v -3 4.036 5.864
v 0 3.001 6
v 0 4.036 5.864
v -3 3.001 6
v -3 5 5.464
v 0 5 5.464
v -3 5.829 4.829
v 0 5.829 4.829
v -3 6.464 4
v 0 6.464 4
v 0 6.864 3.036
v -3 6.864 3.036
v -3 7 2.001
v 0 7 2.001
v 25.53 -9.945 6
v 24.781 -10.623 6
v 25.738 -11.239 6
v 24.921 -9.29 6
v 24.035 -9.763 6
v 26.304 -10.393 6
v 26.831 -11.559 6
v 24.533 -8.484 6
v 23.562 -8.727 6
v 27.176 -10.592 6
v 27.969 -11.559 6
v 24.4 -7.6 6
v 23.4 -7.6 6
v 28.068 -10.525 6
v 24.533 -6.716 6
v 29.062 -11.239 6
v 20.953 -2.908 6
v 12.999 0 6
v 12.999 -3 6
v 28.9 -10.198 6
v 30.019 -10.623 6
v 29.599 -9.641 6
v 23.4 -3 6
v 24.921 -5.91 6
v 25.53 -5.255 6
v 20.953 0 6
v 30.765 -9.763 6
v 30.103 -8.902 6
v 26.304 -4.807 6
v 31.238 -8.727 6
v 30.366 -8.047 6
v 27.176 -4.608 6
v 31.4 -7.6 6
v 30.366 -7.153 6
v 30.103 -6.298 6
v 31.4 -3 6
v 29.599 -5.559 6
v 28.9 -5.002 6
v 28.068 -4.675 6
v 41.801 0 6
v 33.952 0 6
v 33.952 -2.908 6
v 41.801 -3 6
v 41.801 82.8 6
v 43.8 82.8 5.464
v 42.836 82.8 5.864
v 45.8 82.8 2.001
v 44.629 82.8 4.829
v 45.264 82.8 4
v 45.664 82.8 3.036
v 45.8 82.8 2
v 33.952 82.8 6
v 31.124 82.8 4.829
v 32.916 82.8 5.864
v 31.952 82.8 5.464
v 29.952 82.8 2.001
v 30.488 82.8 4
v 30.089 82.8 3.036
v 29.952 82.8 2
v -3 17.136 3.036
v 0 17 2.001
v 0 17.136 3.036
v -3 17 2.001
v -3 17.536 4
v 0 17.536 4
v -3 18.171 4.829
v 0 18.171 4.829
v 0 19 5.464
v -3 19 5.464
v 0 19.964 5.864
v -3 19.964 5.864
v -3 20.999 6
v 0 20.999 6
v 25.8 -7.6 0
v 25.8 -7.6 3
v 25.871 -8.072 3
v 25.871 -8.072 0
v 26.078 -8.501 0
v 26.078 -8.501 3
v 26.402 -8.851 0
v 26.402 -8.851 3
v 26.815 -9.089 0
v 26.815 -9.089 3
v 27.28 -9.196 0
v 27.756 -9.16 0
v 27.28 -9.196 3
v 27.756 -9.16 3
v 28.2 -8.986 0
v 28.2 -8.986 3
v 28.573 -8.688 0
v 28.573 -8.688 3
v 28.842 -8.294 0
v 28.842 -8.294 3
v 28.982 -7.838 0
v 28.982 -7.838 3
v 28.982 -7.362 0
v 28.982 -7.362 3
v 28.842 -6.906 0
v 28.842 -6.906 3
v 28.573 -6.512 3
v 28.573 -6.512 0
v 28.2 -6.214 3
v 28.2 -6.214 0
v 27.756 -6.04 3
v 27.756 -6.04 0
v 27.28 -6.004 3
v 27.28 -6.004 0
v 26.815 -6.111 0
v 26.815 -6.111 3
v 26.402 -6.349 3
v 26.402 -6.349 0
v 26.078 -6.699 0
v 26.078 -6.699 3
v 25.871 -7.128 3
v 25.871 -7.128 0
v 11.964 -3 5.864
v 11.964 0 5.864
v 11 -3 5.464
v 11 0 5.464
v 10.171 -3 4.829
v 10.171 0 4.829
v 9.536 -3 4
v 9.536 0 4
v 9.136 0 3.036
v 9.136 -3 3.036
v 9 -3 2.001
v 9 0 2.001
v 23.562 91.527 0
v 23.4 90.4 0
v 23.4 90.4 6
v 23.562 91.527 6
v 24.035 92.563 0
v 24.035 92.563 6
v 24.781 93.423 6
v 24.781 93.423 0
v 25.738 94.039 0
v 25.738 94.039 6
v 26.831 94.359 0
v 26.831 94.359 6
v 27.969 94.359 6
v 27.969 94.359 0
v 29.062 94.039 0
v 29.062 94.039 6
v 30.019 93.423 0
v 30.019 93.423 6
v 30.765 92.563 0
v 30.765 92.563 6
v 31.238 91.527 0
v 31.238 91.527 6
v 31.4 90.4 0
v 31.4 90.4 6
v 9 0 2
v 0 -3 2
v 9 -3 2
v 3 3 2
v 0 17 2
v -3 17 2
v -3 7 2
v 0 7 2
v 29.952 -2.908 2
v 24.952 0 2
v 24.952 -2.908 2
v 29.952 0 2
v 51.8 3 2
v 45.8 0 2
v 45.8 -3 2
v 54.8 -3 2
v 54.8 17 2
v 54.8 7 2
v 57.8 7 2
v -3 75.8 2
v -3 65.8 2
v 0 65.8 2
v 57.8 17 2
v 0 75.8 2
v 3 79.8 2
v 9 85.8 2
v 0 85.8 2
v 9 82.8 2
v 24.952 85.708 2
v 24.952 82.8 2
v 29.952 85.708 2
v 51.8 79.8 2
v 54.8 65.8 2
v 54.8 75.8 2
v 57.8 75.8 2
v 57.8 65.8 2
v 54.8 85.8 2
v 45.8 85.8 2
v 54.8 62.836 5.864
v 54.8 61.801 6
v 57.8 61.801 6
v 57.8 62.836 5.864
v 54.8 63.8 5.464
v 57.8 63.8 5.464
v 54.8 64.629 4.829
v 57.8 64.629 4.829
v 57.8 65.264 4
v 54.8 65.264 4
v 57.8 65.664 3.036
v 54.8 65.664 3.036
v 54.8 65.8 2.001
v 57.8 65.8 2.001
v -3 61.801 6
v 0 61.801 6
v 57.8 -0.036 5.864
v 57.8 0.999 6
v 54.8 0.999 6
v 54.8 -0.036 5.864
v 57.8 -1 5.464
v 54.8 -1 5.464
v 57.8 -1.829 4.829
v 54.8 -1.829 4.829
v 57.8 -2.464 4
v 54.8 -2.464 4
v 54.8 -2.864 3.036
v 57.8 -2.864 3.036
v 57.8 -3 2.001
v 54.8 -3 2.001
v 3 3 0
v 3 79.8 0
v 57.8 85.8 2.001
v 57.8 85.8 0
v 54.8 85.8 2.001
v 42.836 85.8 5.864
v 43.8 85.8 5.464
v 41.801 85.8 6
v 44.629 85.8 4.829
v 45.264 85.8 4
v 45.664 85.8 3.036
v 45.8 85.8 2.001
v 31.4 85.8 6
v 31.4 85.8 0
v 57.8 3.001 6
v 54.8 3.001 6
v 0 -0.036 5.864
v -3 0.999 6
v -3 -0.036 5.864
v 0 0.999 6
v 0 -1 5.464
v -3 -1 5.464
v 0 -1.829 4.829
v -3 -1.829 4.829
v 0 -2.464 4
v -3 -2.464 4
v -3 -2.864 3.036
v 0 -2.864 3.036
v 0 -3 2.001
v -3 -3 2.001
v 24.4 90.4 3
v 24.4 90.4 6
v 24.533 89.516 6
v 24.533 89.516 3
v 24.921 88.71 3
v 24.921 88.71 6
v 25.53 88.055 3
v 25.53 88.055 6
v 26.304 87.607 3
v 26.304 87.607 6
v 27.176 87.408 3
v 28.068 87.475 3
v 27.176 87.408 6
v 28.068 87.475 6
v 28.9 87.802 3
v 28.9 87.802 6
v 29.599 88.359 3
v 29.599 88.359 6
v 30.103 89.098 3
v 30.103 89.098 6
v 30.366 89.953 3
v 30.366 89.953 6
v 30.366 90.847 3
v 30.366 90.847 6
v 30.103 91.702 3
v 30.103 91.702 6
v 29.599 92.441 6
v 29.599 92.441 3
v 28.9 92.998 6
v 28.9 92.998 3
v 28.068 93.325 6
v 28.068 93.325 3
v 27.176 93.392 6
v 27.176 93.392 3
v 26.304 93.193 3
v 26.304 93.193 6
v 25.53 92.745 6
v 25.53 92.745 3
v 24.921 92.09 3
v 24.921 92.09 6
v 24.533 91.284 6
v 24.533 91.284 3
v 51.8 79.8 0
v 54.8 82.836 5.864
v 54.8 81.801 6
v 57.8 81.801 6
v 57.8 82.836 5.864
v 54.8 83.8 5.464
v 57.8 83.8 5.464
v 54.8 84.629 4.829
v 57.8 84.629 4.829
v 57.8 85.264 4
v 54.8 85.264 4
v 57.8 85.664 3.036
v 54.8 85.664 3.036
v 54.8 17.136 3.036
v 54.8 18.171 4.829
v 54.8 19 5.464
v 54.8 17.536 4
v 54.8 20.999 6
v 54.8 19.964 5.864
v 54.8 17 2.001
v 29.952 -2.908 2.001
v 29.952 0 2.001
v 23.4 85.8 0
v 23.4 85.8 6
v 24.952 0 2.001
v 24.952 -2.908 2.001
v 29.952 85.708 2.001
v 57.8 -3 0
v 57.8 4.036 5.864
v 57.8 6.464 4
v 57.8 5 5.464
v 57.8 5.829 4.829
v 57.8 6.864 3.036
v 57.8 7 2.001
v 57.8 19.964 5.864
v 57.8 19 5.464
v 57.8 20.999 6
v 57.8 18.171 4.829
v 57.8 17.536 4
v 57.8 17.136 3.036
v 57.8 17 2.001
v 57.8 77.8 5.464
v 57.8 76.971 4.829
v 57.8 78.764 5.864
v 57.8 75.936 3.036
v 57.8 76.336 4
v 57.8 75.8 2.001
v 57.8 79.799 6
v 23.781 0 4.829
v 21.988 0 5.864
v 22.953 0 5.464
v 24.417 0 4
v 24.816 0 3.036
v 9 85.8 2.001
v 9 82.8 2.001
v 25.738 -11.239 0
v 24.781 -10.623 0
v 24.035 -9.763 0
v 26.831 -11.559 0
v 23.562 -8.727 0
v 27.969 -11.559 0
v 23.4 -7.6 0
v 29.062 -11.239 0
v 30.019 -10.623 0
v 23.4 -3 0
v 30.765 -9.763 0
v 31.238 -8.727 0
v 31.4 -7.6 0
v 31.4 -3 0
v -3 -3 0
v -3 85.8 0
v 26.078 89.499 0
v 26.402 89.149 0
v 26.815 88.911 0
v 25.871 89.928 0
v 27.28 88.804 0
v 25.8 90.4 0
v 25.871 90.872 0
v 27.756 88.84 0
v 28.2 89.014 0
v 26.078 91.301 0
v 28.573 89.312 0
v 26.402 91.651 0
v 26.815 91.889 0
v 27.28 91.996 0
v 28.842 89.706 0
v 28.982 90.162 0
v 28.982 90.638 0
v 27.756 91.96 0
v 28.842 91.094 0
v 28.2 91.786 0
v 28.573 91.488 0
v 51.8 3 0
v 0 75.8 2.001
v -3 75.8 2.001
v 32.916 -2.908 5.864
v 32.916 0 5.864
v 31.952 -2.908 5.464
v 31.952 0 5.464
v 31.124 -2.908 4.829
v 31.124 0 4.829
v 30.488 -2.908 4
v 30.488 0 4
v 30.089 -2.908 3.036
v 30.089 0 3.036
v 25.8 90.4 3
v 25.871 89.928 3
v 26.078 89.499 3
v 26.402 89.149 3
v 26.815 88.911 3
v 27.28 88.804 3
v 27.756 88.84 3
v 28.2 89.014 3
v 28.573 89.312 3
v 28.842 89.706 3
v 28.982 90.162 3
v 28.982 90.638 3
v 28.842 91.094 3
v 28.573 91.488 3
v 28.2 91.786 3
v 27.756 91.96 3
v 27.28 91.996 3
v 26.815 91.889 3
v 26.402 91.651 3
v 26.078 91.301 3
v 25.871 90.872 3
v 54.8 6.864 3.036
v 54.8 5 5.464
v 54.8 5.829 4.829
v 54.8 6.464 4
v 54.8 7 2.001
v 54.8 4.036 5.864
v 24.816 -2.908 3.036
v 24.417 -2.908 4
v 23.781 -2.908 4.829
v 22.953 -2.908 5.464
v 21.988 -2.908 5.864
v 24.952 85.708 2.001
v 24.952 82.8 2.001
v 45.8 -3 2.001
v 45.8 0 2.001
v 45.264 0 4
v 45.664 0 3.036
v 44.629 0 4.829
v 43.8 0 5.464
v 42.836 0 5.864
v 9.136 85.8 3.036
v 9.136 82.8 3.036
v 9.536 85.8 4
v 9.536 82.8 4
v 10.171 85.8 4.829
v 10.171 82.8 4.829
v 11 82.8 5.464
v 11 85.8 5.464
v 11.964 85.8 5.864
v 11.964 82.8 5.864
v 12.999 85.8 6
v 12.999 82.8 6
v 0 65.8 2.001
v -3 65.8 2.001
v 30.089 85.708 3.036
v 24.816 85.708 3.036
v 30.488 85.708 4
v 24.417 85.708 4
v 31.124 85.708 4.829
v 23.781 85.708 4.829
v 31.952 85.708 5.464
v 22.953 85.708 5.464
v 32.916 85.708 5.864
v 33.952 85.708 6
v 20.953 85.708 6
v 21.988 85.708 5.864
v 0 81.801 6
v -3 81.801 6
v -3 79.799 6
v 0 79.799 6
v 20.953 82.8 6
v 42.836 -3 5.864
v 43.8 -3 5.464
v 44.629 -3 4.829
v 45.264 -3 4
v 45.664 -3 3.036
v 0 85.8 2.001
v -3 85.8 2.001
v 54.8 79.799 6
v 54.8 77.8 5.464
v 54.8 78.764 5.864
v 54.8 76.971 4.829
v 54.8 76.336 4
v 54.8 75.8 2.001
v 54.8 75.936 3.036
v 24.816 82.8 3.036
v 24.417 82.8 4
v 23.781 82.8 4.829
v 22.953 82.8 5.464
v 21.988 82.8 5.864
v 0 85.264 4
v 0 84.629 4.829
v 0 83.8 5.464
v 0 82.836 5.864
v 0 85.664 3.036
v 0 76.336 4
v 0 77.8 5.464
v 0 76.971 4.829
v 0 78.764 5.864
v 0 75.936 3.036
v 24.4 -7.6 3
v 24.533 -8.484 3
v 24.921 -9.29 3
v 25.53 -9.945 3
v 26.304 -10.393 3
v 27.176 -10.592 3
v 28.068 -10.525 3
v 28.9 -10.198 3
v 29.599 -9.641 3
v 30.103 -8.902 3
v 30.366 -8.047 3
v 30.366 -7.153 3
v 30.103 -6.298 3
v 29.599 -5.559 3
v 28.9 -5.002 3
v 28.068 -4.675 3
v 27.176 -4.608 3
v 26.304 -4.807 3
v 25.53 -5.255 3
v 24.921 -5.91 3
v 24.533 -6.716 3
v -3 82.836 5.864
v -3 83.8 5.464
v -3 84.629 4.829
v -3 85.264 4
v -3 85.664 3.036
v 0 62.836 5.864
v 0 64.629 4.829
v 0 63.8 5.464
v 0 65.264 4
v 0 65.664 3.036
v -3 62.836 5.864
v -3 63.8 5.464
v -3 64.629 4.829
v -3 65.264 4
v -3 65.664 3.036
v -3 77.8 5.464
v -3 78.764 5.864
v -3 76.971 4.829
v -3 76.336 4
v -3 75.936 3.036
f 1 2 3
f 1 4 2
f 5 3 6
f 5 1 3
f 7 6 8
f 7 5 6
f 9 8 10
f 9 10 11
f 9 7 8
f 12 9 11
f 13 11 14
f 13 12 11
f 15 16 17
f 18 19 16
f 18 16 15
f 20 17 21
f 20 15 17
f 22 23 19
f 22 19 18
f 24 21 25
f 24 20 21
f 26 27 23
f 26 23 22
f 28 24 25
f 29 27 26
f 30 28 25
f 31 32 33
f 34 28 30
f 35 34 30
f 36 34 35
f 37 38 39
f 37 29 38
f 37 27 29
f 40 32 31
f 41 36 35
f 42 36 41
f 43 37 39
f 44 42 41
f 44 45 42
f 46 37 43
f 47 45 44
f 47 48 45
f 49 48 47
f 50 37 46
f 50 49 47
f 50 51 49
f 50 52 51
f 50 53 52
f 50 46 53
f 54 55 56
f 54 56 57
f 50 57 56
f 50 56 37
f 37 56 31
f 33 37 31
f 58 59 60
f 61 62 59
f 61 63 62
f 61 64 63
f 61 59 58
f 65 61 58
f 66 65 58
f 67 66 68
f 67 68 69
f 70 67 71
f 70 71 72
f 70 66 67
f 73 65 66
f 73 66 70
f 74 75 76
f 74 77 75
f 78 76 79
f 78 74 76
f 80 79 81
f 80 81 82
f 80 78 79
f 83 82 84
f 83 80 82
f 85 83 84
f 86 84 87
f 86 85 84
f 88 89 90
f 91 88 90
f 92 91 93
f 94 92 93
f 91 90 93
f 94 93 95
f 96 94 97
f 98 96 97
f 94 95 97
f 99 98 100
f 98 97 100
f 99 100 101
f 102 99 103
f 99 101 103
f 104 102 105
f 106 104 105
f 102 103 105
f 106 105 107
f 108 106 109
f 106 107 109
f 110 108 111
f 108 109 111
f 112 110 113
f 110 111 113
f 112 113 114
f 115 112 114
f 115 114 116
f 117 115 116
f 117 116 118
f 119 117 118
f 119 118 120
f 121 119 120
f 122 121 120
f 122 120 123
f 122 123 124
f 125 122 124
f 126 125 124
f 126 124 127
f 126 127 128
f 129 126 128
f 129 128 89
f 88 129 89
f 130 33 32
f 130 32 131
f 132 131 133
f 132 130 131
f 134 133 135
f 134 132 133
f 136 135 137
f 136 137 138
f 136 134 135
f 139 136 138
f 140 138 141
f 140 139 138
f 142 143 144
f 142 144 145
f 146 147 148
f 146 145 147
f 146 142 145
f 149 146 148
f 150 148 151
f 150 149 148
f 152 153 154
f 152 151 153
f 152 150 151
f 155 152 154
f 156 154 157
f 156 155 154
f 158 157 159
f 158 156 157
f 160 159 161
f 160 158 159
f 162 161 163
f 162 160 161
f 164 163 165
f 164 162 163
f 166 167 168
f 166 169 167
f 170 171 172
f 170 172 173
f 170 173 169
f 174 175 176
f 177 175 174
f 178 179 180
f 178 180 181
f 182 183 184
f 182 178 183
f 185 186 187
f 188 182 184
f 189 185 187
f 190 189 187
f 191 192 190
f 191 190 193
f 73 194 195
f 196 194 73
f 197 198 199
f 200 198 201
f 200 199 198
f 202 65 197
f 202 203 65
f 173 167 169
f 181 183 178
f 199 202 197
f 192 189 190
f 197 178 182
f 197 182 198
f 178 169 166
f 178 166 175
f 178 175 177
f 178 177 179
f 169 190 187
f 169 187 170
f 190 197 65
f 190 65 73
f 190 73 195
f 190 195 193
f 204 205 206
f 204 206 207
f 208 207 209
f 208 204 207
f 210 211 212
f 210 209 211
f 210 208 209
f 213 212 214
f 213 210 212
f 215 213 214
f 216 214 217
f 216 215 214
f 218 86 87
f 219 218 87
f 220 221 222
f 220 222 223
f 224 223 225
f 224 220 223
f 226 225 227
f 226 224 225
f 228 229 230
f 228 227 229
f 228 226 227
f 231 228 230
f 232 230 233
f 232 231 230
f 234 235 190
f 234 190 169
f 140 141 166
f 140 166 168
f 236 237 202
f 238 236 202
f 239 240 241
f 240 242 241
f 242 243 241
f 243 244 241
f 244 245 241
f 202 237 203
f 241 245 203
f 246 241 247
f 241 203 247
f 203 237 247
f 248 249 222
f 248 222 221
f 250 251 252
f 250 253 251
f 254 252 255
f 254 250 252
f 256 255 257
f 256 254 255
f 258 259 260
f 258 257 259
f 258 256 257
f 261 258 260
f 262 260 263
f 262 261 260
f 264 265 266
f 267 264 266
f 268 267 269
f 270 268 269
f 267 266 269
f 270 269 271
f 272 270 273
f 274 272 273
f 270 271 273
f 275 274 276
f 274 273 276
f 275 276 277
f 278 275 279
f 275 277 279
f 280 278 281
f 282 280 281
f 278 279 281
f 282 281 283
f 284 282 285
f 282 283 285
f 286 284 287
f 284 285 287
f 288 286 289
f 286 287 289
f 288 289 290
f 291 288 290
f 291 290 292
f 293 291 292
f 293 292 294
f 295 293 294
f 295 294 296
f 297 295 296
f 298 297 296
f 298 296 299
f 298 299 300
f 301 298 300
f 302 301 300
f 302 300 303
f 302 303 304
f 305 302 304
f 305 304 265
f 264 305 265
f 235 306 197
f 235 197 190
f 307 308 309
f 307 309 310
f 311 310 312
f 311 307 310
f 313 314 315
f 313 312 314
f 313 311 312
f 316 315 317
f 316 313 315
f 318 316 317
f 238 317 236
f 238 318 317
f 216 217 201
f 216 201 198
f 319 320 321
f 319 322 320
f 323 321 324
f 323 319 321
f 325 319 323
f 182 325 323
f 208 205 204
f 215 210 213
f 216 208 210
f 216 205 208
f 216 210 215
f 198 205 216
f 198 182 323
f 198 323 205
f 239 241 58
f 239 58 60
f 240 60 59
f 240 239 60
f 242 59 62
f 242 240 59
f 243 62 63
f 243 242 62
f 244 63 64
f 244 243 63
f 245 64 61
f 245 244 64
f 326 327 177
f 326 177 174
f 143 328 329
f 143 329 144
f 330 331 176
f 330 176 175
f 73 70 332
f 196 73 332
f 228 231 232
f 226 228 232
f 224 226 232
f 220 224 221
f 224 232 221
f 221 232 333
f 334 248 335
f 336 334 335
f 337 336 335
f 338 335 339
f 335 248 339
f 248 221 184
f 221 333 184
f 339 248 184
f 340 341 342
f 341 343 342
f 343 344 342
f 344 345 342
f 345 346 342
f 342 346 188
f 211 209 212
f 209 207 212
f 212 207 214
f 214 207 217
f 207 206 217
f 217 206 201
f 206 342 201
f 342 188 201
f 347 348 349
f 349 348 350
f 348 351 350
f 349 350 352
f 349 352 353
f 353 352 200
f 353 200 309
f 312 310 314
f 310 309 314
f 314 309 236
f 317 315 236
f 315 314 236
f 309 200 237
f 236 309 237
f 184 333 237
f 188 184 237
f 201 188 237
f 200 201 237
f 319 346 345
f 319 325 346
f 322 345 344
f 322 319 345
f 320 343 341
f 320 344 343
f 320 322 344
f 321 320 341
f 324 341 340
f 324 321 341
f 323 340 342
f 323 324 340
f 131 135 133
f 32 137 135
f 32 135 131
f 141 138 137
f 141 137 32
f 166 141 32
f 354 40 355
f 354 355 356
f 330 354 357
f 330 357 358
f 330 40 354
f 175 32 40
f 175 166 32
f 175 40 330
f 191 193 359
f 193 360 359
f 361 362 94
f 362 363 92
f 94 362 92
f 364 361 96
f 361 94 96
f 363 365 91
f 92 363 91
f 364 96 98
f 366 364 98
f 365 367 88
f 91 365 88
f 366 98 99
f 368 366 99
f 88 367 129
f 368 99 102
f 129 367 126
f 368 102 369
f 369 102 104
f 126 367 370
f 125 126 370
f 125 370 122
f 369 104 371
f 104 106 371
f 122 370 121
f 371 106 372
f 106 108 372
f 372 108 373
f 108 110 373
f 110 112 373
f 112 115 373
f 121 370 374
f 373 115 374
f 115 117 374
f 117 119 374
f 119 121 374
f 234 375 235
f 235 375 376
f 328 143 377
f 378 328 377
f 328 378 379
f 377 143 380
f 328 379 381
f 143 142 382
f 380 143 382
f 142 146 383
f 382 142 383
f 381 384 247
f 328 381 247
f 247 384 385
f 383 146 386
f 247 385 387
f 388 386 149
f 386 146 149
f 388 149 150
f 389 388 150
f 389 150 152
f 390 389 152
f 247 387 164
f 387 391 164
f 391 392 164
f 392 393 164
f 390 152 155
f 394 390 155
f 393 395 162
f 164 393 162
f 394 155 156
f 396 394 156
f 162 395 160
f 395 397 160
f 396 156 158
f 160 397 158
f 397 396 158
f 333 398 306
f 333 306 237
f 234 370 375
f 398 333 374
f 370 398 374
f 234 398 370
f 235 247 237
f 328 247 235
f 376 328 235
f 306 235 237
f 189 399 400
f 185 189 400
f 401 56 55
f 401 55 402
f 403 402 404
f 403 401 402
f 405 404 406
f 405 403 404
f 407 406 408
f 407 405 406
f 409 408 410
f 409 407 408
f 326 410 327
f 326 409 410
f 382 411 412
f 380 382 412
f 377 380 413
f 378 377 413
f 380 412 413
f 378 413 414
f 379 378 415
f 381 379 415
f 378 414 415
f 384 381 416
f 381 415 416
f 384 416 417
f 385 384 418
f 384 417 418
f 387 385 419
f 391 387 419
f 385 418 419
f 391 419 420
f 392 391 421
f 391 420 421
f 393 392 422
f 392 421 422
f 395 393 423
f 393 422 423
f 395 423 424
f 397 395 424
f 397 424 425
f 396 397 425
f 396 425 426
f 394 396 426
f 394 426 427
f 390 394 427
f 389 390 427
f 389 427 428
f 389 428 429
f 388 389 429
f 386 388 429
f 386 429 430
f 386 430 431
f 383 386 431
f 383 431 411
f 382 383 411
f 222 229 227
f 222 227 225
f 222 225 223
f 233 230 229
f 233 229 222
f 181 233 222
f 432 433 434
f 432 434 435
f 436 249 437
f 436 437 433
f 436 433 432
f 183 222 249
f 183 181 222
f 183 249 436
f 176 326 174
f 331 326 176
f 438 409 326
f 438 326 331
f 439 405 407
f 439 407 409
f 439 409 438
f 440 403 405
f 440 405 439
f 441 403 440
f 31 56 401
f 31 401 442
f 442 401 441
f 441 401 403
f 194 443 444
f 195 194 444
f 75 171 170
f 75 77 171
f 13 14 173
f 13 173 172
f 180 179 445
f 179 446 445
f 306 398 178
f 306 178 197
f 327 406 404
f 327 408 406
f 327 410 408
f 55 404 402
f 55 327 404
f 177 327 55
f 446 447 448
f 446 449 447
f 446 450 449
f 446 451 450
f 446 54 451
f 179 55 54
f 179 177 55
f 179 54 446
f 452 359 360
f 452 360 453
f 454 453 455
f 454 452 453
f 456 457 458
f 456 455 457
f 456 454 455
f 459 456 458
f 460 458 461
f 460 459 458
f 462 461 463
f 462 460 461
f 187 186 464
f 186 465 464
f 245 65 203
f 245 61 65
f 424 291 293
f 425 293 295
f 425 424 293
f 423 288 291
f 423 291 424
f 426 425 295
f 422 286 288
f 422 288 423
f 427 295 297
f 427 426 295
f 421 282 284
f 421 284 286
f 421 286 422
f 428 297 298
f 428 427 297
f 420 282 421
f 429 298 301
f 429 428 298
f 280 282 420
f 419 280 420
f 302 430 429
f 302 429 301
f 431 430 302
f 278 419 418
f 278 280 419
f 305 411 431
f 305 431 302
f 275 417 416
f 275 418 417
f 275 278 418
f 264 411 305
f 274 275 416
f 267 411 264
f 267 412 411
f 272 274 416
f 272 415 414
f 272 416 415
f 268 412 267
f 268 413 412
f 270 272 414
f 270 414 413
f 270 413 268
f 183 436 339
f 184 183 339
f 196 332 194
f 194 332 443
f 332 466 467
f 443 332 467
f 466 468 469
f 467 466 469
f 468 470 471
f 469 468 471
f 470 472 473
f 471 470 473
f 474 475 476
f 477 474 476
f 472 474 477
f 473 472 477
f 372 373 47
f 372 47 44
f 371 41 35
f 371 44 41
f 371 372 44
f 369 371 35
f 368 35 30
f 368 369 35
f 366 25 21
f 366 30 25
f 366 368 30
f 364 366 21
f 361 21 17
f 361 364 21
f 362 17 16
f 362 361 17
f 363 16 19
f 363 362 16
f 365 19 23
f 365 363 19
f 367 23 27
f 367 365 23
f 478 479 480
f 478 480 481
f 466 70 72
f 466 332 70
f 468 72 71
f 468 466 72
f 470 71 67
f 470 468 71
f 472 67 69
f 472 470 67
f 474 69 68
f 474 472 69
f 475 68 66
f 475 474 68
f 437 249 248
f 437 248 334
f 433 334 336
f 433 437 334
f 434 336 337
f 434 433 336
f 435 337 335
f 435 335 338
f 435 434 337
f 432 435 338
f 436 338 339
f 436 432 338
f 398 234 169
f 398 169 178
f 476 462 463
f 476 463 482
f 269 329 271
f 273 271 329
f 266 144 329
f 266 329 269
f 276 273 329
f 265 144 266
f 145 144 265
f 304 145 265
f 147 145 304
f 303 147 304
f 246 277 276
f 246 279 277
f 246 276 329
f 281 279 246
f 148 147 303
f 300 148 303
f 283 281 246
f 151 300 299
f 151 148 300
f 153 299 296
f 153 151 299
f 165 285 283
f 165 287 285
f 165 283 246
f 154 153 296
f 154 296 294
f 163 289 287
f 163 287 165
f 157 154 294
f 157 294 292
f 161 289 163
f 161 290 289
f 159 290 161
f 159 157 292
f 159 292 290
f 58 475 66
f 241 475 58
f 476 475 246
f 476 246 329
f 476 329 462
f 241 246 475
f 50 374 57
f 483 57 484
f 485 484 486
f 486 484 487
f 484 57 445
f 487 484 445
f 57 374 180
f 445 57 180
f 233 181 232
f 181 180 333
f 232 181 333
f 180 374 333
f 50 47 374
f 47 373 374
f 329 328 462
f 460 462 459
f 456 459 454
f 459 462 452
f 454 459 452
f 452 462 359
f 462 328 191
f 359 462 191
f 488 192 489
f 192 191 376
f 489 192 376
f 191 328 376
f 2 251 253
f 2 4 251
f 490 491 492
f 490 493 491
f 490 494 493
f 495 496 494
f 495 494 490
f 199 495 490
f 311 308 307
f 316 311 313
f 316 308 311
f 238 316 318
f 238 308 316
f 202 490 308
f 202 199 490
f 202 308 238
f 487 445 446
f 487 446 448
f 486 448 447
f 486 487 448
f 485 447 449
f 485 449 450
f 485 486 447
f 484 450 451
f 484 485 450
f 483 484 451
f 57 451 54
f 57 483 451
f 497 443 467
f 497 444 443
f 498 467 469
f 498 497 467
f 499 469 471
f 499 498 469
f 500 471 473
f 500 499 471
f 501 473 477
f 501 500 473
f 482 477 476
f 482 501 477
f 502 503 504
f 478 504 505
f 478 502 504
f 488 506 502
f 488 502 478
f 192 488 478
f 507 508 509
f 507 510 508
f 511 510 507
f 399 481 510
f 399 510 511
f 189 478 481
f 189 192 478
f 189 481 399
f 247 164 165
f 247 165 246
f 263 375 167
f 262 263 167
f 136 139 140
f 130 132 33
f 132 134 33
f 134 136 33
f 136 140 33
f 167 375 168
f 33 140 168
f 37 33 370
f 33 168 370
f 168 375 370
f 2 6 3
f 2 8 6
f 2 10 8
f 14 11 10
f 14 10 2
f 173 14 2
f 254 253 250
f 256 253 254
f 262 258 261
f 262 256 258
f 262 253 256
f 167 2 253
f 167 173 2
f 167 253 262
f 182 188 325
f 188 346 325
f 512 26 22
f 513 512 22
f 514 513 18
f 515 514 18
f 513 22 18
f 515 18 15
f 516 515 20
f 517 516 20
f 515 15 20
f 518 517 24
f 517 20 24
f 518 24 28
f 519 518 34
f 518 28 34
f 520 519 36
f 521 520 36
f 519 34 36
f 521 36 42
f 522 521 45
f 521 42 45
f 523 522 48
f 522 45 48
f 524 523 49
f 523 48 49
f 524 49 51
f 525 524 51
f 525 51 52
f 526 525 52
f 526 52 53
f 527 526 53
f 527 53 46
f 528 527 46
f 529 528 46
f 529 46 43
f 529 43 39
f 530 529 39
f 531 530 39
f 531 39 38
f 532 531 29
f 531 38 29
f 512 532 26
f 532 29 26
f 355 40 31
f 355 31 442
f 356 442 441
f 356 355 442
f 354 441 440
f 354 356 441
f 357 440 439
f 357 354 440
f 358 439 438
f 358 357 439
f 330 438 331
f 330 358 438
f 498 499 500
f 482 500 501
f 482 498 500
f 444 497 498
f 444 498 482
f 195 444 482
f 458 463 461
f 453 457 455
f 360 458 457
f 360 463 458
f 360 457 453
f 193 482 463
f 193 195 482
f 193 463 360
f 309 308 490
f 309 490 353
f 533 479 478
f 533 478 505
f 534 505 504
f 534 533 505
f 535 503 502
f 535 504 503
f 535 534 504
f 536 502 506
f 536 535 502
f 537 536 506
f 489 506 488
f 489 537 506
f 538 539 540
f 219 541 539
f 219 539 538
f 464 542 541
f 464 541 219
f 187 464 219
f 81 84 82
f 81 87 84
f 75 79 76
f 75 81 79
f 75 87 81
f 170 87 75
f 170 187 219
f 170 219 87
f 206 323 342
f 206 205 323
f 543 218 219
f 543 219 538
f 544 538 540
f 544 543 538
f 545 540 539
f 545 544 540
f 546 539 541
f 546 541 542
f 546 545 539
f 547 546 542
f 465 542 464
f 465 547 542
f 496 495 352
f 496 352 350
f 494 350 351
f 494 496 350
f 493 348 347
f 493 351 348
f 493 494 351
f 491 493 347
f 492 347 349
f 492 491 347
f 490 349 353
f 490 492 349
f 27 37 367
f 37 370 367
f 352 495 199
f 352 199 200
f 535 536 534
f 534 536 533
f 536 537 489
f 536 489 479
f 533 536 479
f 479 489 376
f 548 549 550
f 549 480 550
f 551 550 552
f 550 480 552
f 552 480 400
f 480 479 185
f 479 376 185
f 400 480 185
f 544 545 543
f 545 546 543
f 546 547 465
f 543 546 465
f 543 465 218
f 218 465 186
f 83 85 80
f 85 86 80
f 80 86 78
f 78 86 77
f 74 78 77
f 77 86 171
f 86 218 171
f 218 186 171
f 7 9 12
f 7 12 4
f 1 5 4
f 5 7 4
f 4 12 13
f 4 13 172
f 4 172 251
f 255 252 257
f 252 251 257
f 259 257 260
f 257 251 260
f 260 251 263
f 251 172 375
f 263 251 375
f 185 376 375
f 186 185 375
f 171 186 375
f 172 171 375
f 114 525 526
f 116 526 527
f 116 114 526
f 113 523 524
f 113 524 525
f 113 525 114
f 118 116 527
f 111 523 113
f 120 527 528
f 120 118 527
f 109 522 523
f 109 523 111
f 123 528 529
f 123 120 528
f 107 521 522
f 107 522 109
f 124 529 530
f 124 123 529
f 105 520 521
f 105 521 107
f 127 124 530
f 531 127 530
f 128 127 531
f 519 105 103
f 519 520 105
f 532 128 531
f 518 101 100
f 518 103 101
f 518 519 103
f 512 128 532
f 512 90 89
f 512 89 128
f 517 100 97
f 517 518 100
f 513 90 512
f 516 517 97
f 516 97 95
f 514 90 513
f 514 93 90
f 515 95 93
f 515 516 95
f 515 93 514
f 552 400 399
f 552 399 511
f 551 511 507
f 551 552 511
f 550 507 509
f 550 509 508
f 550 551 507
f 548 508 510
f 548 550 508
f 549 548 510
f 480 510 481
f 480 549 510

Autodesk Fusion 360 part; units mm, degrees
sketch "Sketch4" plane through (0, 0, 0) normal (0, 0, 1) x (1, 0, 0)
  line L0 (0, 0) -> (54.8, 0)
  line L1 (54.8, 0) -> (54.8, 82.8)
  line L2 (54.8, 82.8) -> (0, 82.8)
  line L3 (0, 82.8) -> (0, 0)
  line L4 (57.8, -3) -> (57.8, 85.8)
  line L5 (-3, 85.8) -> (-3, -3)
  line L6 (0, 41.4) -> (54.8, 41.4) construction
  line L7 (27.4, 0) -> (27.4, 1.8094) construction
  line L8 (27.4, 1.8094) -> (27.4, 82.8) construction
  line L9 (23.4, 85.8) -> (23.4, 90.4)
  line L10 (31.4, 90.4) -> (31.4, 85.8)
  line L11 (23.4, -3) -> (23.4, -7.6)
  line L12 (31.4, -7.6) -> (31.4, -3)
  arc A0 (31.4, 90.4) -> (23.4, 90.4) centre (27.4, 90.4) ccw
  arc A1 (23.4, -7.6) -> (31.4, -7.6) centre (27.4, -7.6) ccw
  line L13 (-3, -3) -> (23.4, -3)
  line L14 (31.4, -3) -> (57.8, -3)
  line L15 (57.8, 85.8) -> (31.4, 85.8)
  line L16 (23.4, 85.8) -> (-3, 85.8)
  line L17 (3, 3) -> (51.8, 3)
  line L18 (51.8, 3) -> (51.8, 79.8)
  line L19 (51.8, 79.8) -> (3, 79.8)
  line L20 (3, 79.8) -> (3, 3)
  point P0 (27.4, 90.4)
  point P1 (27.4, -7.6)
  dimension "d22" = 54.8
  dimension "d23" = 82.8
  dimension "d25" = 8
  dimension "d26" = 49
  dimension "d27" = 49
  dimension "d30" = -3
extrude "Extrude5" add sketch "Sketch4" along normal blind 2 contours L0 L1 L2 L3
extrude "Extrude6" add sketch "Sketch4" along normal blind 6 contours L4 L5 L9 L10 L11 L12 A0 A1 L13 L14 L15 L16
sketch "Sketch5" plane through (0, 0, 6) normal (0, 0, 1) x (-1, 0, 0)
  line L0 (0, 0) -> (0, -82.8)
  line L1 (0, -82.8) -> (-54.8, -82.8)
  line L2 (-54.8, -82.8) -> (-54.8, 0)
  line L3 (-54.8, 0) -> (0, 0)
  arc A0 (-31.4, -90.4) -> (-23.4, -90.4) centre (-27.4, -90.4) ccw
  line L4 (-23.4, -90.4) -> (-23.4, -85.8)
  line L5 (-23.4, -85.8) -> (3, -85.8)
  line L6 (3, -85.8) -> (3, 3)
  line L7 (3, 3) -> (-23.4, 3)
  line L8 (-23.4, 3) -> (-23.4, 7.6)
  arc A1 (-23.4, 7.6) -> (-31.4, 7.6) centre (-27.4, 7.6) ccw
  line L9 (-31.4, 7.6) -> (-31.4, 3)
  line L10 (-31.4, 3) -> (-57.8, 3)
  line L11 (-57.8, 3) -> (-57.8, -85.8)
  line L12 (-57.8, -85.8) -> (-31.4, -85.8)
  line L13 (-31.4, -85.8) -> (-31.4, -90.4)
  circle A2 centre (-27.4, -90.4) radius 3
  circle A3 centre (-27.4, 7.6) radius 3
  dimension "d35" = 6
extrude "Extrude7" cut sketch "Sketch5" against normal blind 3 contours A2 | A3
sketch "Sketch6" plane through (0, 0, 3) normal (0, 0, 1) x (-1, 0, 0)
  circle A0 centre (-27.4, -90.4) radius 3
  circle A1 centre (-27.4, -90.4) radius 1.6
  circle A2 centre (-27.4, 7.6) radius 1.6
  dimension "d38" = 3.2
  dimension "d39" = 3.2
extrude "Extrude8" cut sketch "Sketch6" against normal blind 4 contours A1 | A2
sketch "Sketch7" plane through (0, 0, 6) normal (0, 0, 1) x (-1, 0, 0)
  circle A0 centre (-27.4, -90.4) radius 3
  circle A1 centre (-27.4, 7.6) radius 3
  line L0 (0, 0) -> (0, -82.8)
  line L1 (0, -82.8) -> (-54.8, -82.8)
  line L2 (-54.8, -82.8) -> (-54.8, 0)
  line L3 (-54.8, 0) -> (0, 0)
  arc A2 (-31.4, -90.4) -> (-23.4, -90.4) centre (-27.4, -90.4) ccw
  line L4 (-23.4, -90.4) -> (-23.4, -85.8)
  line L5 (-23.4, -85.8) -> (3, -85.8)
  line L6 (3, -85.8) -> (3, 3)
  line L7 (3, 3) -> (-23.4, 3)
  line L8 (-23.4, 3) -> (-23.4, 7.6)
  arc A3 (-23.4, 7.6) -> (-31.4, 7.6) centre (-27.4, 7.6) ccw
  line L9 (-31.4, 7.6) -> (-31.4, 3)
  line L10 (-31.4, 3) -> (-57.8, 3)
  line L11 (-57.8, 3) -> (-57.8, -85.8)
  line L12 (-57.8, -85.8) -> (-31.4, -85.8)
  line L13 (-31.4, -85.8) -> (-31.4, -90.4)
  line L14 (4.5, -17) -> (-1.5, -17)
  line L15 (-1.5, -17) -> (-1.5, -7)
  line L16 (-1.5, -7) -> (4.5, -7)
  line L17 (4.5, -7) -> (4.5, -17)
  line L18 (4.5, -17) -> (-1.5, -7) construction
  line L19 (-1.5, -17) -> (4.5, -7) construction
  line L20 (3, -41.4) -> (-57.8, -41.4) construction
  line L21 (-27.4, 0) -> (-27.4, -82.8) construction
  line L22 (-1.5, -75.8) -> (4.5, -75.8)
  line L23 (4.5, -75.8) -> (4.5, -65.8)
  line L24 (-1.5, -65.8) -> (-1.5, -75.8)
  line L25 (4.5, -65.8) -> (-1.5, -65.8)
  line L26 (0, 0) -> (-9, 0)
  line L27 (-9, 0) -> (-9, 3)
  line L28 (-9, 3) -> (0, 3)
  line L29 (0, 3) -> (0, 0)
  line L30 (-54.8, 0) -> (-45.8, 0)
  line L31 (-45.8, 3) -> (-54.8, 3)
  line L32 (-54.8, 3) -> (-54.8, 0)
  line L33 (-45.8, 0) -> (-45.8, 3)
  line L34 (-29.9523, 2.9079) -> (-24.9523, 2.9079)
  line L35 (-24.9523, 2.9079) -> (-24.9523, -0.0921)
  line L36 (-24.9523, -0.0921) -> (-29.9523, -0.0921)
  line L37 (-29.9523, -0.0921) -> (-29.9523, 2.9079)
  line L38 (-29.9523, 2.9079) -> (-24.9523, -0.0921) construction
  line L39 (-24.9523, 2.9079) -> (-29.9523, -0.0921) construction
  line L40 (-24.9523, -82.7079) -> (-29.9523, -82.7079)
  line L41 (-24.9523, -85.7079) -> (-24.9523, -82.7079)
  line L42 (-29.9523, -85.7079) -> (-24.9523, -85.7079)
  line L43 (-29.9523, -82.7079) -> (-29.9523, -85.7079)
  line L44 (0, -82.8) -> (-9, -82.8)
  line L45 (-9, -82.8) -> (-9, -85.8)
  line L46 (-9, -85.8) -> (0, -85.8)
  line L47 (0, -85.8) -> (0, -82.8)
  line L48 (-45.8, -82.8) -> (-45.8, -85.8)
  line L49 (-45.8, -85.8) -> (-54.8, -85.8)
  line L50 (-54.8, -85.8) -> (-54.8, -82.8)
  line L51 (-54.8, -82.8) -> (-45.8, -82.8)
  line L52 (-59.3, -65.8) -> (-53.3, -65.8)
  line L53 (-53.3, -65.8) -> (-53.3, -75.8)
  line L54 (-53.3, -75.8) -> (-59.3, -75.8)
  line L55 (-59.3, -75.8) -> (-59.3, -65.8)
  line L56 (-53.3, -17) -> (-53.3, -7)
  line L57 (-53.3, -7) -> (-59.3, -7)
  line L58 (-59.3, -7) -> (-59.3, -17)
  line L59 (-59.3, -17) -> (-53.3, -17)
  point P0 (1.5, -12)
  point P1 (-27.4523, 1.4079)
  dimension "d42" = 10
  dimension "d43" = 12
  dimension "d44" = 9
  dimension "d45" = 5
  dimension "d46" = 3
extrude "Extrude9" cut sketch "Sketch7" against normal blind 4 contours L3 L7 L26 L27 L28 L29 | L0 L6 L14 L16 | L0 L14 L15 L16 | L6 L14 L16 L17 | L3 L34 L35 L37 | L0 L6 L22 L25 | L0 L22 L24 L25 | L6 L22 L23 L25 | L3 L10 L30 L31 L32 L33 | L1 L5 L44 L45 L46 L47 | L2 L56 L57 L59 | L2 L11 L57 L59 | L1 L41 L42 L43 | L11 L57 L58 L59 | L2 L52 L53 L54 | L2 L11 L52 L54 | L1 L12 L48 L49 L50 L51 | L11 L52 L54 L55
fillet "Empalme4" radius 4 20 edges at (56.3, 17, 6) (56.3, 7, 6) (56.3, -3, 6) (45.8, -1.5, 6) (29.9523, -1.454, 6) (24.9523, -1.454, 6) (9, -1.5, 6) (-1.5, -3, 6) (-1.5, 7, 6) (-1.5, 17, 6) (56.3, 65.8, 6) (56.3, 75.8, 6) (56.3, 85.8, 6) (45.8, 84.3, 6) (29.9523, 84.254, 6) (24.9523, 84.254, 6) (-1.5, 75.8, 6) (-1.5, 65.8, 6) (-1.5, 85.8, 6) (9, 84.3, 6)
